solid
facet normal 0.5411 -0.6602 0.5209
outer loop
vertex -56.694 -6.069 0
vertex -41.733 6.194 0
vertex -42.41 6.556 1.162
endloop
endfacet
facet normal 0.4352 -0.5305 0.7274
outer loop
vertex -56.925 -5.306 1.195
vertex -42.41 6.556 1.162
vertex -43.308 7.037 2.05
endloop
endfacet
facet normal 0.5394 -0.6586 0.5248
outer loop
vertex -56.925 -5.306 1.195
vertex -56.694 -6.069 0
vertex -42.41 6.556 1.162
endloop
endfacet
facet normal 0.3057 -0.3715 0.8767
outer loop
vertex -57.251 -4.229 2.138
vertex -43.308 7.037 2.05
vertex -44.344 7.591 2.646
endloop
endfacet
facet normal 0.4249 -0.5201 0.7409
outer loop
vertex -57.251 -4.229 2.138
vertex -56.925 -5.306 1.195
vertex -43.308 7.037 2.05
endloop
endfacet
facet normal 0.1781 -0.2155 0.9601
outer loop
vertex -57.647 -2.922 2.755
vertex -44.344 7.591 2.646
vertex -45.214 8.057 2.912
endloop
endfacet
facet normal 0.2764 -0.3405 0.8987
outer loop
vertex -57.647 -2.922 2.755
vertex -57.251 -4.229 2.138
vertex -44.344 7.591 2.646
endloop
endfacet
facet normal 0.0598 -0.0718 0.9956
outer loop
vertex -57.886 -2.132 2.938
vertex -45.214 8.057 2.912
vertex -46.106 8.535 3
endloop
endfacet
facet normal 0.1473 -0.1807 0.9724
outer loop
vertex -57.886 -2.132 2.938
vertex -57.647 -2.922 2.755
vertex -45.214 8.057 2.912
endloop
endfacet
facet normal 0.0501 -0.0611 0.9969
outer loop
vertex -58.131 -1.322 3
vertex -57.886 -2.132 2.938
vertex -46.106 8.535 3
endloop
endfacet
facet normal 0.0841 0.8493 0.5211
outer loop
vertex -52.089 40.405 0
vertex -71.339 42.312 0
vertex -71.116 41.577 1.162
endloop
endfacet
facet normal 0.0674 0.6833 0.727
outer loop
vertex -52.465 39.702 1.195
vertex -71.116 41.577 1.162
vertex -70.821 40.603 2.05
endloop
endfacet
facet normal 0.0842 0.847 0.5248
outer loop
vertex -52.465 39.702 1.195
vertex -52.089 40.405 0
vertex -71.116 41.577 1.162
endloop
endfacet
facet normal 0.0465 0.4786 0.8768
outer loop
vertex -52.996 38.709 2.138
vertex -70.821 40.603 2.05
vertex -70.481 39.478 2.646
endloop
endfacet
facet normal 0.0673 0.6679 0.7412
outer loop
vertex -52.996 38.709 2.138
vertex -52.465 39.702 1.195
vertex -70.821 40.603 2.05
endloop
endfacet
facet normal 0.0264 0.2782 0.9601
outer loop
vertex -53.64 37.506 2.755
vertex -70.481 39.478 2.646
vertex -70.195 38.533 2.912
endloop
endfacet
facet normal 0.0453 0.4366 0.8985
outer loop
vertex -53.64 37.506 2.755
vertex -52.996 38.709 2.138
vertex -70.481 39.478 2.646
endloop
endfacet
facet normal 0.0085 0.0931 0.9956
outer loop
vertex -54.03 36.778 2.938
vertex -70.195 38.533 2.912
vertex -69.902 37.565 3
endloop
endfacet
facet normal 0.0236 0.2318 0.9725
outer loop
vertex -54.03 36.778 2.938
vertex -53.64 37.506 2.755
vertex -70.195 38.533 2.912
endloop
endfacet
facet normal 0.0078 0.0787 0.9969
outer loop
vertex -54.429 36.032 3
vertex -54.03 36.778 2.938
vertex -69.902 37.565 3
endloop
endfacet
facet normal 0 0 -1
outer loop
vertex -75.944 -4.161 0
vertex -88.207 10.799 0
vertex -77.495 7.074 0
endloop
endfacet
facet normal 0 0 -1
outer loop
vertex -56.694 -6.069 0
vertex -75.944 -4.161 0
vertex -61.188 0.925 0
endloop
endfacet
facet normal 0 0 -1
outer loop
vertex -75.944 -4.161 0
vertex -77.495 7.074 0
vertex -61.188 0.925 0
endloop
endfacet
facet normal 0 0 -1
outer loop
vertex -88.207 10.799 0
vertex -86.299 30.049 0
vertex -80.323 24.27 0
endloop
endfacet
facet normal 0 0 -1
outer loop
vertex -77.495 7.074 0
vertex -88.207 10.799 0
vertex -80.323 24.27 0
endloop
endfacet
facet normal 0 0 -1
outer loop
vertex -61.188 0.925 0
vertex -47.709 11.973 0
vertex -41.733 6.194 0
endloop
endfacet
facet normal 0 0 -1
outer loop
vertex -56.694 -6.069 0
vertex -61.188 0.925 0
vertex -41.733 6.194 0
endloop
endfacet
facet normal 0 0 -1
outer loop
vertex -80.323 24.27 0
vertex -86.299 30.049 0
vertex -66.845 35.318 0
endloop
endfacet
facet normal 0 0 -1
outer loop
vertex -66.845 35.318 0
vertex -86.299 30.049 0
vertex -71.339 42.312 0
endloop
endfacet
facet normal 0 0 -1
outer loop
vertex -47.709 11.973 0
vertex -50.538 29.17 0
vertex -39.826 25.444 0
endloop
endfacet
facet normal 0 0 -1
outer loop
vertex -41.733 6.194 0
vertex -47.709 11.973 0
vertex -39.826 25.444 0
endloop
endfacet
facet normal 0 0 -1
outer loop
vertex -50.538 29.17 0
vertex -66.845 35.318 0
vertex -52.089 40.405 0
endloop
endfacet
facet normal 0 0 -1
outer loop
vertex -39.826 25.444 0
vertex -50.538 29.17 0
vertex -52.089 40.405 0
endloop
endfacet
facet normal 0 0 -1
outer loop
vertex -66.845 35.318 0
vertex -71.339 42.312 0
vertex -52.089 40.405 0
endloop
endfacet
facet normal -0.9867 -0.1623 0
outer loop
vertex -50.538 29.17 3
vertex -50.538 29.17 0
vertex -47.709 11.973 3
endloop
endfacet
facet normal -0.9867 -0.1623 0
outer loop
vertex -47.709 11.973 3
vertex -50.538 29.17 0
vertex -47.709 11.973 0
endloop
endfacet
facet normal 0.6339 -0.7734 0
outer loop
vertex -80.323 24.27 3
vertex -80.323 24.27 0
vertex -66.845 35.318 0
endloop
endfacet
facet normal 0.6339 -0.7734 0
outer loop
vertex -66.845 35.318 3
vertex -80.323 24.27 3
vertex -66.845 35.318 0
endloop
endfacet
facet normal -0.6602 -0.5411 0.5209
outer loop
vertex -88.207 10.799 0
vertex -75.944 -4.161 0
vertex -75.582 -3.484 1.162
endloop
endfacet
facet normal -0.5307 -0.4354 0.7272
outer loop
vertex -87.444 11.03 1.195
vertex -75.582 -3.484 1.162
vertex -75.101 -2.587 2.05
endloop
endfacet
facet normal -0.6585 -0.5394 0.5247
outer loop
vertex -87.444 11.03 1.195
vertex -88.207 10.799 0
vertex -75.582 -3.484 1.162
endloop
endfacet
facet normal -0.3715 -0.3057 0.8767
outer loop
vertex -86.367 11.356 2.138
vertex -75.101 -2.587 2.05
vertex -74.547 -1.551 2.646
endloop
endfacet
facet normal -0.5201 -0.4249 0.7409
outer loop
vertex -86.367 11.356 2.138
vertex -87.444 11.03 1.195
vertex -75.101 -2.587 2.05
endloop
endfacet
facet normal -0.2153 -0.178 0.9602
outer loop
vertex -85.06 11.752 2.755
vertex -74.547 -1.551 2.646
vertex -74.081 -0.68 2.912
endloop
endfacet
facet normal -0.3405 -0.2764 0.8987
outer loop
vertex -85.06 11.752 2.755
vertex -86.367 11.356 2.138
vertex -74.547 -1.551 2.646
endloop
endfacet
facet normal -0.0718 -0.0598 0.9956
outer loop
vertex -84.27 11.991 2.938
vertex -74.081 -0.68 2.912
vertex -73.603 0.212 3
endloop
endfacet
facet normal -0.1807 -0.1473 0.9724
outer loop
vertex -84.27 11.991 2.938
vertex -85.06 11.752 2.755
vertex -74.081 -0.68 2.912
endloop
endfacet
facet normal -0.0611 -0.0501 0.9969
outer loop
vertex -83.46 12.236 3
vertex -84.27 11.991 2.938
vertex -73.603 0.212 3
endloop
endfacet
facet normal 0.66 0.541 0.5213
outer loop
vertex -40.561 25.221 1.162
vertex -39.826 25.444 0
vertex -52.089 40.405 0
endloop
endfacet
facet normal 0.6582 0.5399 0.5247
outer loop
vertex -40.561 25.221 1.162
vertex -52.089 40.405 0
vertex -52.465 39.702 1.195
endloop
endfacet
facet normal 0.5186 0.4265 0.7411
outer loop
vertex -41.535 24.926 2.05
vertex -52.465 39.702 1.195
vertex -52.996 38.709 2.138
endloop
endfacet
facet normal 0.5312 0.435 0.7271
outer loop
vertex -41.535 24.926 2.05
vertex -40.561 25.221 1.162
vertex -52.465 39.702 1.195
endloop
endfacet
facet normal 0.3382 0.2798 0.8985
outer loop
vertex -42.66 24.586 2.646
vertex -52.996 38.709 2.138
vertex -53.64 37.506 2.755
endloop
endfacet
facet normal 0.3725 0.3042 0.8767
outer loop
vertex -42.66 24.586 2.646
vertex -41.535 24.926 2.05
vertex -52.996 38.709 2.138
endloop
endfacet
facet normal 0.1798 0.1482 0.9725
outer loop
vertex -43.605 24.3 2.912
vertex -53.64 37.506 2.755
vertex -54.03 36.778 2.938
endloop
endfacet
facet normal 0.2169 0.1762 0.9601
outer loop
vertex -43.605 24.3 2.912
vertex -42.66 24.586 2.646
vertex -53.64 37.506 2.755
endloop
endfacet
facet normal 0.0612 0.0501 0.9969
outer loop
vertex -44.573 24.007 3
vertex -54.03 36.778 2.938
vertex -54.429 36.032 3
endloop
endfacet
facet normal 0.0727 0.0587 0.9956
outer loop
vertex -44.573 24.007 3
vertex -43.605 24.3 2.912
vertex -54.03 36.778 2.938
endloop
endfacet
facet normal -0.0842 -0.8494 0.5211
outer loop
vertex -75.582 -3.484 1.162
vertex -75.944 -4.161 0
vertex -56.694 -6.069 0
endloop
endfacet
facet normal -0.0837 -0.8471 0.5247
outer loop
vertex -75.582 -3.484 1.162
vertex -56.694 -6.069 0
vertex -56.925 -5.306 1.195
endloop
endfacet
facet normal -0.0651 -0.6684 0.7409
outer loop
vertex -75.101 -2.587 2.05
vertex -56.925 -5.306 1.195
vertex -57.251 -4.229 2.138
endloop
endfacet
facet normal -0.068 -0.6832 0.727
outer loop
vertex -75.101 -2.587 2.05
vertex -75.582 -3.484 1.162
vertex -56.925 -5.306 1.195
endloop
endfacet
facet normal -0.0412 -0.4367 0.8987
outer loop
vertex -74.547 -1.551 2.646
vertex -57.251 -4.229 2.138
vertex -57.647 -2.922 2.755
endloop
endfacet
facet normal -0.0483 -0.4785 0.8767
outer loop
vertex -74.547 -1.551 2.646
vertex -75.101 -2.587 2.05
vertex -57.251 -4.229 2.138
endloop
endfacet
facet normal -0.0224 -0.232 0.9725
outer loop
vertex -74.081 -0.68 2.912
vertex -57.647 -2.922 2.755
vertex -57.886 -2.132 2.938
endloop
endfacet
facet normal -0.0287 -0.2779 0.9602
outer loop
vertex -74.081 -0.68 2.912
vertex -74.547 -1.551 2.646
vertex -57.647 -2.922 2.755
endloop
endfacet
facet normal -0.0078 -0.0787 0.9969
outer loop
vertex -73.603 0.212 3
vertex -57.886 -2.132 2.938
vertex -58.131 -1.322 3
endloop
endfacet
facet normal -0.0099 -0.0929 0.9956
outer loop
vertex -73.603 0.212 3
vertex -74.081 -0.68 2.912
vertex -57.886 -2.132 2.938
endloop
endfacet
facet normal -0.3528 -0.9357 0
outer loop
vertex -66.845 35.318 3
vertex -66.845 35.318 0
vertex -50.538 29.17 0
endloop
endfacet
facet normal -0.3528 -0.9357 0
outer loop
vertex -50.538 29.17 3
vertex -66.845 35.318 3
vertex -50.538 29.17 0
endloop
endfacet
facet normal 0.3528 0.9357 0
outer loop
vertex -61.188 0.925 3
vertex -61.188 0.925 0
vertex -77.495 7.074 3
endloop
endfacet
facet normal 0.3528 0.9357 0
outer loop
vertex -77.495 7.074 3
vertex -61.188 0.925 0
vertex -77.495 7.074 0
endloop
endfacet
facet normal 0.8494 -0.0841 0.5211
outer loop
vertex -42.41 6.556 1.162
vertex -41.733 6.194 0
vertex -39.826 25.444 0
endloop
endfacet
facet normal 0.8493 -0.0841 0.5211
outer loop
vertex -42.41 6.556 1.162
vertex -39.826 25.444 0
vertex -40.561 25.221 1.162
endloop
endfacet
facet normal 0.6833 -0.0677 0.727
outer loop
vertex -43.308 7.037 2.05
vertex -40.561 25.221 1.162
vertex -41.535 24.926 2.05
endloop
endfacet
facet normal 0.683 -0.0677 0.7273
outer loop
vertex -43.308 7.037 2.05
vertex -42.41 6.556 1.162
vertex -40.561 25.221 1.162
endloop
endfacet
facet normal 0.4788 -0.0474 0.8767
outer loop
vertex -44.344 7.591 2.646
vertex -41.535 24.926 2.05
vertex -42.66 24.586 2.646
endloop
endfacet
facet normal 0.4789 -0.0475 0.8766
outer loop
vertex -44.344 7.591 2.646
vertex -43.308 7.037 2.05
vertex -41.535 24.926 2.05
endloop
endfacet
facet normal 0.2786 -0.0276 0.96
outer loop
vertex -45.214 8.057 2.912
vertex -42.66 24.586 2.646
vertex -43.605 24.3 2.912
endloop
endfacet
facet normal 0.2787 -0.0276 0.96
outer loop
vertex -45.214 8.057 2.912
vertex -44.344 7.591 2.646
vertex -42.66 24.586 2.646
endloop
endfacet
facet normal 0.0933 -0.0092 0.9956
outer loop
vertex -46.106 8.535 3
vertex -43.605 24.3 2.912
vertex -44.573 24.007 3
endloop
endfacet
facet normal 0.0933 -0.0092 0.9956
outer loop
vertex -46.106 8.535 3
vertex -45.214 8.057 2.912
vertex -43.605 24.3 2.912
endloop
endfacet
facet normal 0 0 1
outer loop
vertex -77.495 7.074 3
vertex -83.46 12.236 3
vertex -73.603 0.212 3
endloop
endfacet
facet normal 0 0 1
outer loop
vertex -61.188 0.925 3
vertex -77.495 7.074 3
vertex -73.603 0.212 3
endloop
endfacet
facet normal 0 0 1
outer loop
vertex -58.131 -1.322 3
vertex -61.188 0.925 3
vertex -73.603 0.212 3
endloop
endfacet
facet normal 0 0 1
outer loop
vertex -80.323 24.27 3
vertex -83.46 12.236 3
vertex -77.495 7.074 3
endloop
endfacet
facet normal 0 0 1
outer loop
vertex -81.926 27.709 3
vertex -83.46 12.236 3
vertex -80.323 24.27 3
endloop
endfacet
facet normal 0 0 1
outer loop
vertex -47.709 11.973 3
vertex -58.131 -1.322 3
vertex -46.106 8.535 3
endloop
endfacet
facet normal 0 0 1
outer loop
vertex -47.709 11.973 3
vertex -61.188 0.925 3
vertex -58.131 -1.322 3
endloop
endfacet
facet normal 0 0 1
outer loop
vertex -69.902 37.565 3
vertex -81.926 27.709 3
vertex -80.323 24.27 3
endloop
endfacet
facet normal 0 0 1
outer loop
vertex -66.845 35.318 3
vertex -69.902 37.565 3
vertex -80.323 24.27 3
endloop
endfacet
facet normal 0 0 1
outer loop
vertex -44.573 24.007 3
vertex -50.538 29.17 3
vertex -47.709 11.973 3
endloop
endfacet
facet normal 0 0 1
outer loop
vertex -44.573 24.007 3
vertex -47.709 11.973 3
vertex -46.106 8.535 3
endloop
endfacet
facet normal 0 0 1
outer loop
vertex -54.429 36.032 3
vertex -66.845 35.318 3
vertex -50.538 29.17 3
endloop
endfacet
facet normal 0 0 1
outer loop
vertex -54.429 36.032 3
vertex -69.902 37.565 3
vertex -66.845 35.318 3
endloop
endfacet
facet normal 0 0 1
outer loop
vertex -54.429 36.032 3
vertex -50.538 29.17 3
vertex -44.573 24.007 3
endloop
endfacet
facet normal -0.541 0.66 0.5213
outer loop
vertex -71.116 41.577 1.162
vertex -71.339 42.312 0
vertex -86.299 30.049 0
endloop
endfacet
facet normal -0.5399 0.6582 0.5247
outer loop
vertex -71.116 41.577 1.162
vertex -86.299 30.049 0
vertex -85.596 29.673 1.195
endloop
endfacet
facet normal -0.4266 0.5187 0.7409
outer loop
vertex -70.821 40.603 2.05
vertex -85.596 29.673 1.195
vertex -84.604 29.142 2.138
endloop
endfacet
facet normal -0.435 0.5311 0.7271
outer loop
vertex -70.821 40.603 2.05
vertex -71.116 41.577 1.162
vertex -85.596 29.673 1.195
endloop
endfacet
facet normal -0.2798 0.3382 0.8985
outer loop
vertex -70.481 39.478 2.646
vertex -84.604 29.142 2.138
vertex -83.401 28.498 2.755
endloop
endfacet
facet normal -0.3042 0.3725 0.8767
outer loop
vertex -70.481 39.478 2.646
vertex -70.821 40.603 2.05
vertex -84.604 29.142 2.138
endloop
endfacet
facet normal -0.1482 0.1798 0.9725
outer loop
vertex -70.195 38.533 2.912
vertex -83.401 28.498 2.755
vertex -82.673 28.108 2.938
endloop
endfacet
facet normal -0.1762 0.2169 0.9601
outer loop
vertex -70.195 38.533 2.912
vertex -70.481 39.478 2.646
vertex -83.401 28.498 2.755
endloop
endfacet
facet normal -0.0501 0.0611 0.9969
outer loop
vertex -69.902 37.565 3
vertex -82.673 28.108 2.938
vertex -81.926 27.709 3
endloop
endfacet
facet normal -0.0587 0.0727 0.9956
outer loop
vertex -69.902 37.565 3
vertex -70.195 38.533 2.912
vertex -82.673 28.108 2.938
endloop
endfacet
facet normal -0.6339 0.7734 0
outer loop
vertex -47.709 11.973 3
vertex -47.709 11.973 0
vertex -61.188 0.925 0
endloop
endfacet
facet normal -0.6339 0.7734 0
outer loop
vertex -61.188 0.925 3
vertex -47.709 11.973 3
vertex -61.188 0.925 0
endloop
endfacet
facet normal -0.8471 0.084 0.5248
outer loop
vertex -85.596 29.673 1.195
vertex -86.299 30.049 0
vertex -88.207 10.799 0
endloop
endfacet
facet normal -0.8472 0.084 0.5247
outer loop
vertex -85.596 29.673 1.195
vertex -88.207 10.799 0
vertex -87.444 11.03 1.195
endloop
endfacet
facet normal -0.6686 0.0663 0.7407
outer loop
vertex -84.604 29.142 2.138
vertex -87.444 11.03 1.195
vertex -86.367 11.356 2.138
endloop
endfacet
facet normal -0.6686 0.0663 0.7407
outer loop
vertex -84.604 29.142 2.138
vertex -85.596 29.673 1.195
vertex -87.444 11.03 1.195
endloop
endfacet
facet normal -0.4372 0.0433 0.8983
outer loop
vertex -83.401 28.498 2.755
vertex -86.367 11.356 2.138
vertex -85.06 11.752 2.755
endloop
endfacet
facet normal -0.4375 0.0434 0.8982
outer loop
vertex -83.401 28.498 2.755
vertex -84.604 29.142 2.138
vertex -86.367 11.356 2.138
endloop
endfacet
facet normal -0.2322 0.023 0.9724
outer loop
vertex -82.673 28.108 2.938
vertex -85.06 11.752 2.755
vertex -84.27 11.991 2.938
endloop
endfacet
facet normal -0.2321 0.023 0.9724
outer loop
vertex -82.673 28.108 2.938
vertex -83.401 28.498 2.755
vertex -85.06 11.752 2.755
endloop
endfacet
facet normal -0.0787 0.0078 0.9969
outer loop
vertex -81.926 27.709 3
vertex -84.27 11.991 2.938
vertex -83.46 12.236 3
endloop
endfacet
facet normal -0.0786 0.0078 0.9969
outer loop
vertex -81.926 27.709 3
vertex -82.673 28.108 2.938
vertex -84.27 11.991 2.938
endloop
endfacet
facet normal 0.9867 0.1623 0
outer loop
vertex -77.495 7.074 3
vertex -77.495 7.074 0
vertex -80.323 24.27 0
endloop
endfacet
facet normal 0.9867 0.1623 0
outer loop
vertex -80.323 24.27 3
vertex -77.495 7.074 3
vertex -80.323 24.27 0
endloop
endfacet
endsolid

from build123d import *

# Parameters (mm, degrees)
F1_DEPTH     = 3
F2_T1_DEPTH  = 42.25719254
F2_T3_DEPTH  = 42.25719254
F2_T5_DEPTH  = 42.25719254
F2_T7_DEPTH  = 42.25719254
F2_T9_DEPTH  = 42.25719254
F2_T11_DEPTH = 42.25719254
F2_T13_DEPTH = 42.25719254
F2_T15_DEPTH = 42.25719254


# Not quite as in the source:
# - a fillet or chamfer that OpenCascade refuses, or shapes differently, is made with other operations: its cross-section is extruded or revolved along the edge and cut away or added


with BuildPart() as f1:
    # F0 (on Top) → F1 (new body)
    with BuildSketch(Plane.XY):
        Polygon((-56.6940829158, -6.0690771788), (-41.7333427947, 6.1938238515), (-39.825682479, 25.4438451183), (-52.0885835093, 40.4045852394), (-71.3386047761, 42.3122455551), (-86.2993448973, 30.0493445247), (-88.2070052129, 10.7993232579), (-75.9441041826, -4.1614168632), align=None)
        Polygon((-77.4948558278, 7.0736241854), (-80.3234138592, 24.2703379682), (-66.8449018774, 35.318297971), (-50.5378318641, 29.1695441909), (-47.7092738327, 11.972830408), (-61.1877858145, 0.9248704053), align=None, mode=Mode.SUBTRACT)
    extrude(amount=F1_DEPTH)

    # F2: fillet of radius 5 on 8 edges, made by hand

    # F2_s2 → F2_t1 (cut)
    with BuildSketch(Plane(origin=(-44.1465389595, 4.3748835016, 0), x_dir=(0, 0, 1), z_dir=(-0.9951255548, 0.0986160744, 0))):
        with BuildLine():
            ThreePointArc((0, 35.0708636755), (2.1833001327, 33.2269007681), (3, 30.4882879806))
            Line((3, 30.4882879806), (3, 35.0708636755))
            Line((3, 35.0708636755), (0, 35.0708636755))
        make_face()
    extrude(amount=F2_T1_DEPTH, mode=Mode.SUBTRACT)

    # F2_s4 → F2_t3 (cut)
    with BuildSketch(Plane(origin=(-13.0651926295, -10.709173668, 0), x_dir=(0, 0, 1), z_dir=(-0.7733921229, -0.633927933, 0))):
        with BuildLine():
            ThreePointArc((0, 77.9474916828), (2.1833001327, 76.1035287753), (3, 73.3649159878))
            Line((3, 73.3649159878), (3, 77.9474916828))
            Line((3, 77.9474916828), (0, 77.9474916828))
        make_face()
    extrude(amount=F2_T3_DEPTH, mode=Mode.SUBTRACT)

    # F2_s6 → F2_t5 (cut)
    with BuildSketch(Plane(origin=(3.2394204217, 32.6886875499, 0), x_dir=(0, 0, 1), z_dir=(-0.0986160744, -0.9951255548, 0))):
        with BuildLine():
            ThreePointArc((0, 88.8420318681), (2.1833001327, 86.9980689606), (3, 84.2594561731))
            Line((3, 84.2594561731), (3, 88.8420318681))
            Line((3, 88.8420318681), (0, 88.8420318681))
        make_face()
    extrude(amount=F2_T5_DEPTH, mode=Mode.SUBTRACT)

    # F2_s8 → F2_t7 (cut)
    with BuildSketch(Plane(origin=(-48.0044686533, 58.5654551398, 0), x_dir=(0, 0, 1), z_dir=(0.633927933, -0.7733921229, 0))):
        with BuildLine():
            ThreePointArc((0, 61.3726103468), (2.1833001327, 59.5286474393), (3, 56.7900346518))
            Line((3, 56.7900346518), (3, 61.3726103468))
            Line((3, 61.3726103468), (0, 61.3726103468))
        make_face()
    extrude(amount=F2_T7_DEPTH, mode=Mode.SUBTRACT)

    # F2_s10 → F2_t9 (cut)
    with BuildSketch(Plane(origin=(-86.1977511311, 8.5421219464, 0), x_dir=(0, 0, 1), z_dir=(0.9951255548, -0.0986160744, 0))):
        with BuildLine():
            ThreePointArc((0, 11.6304416954), (2.1833001327, 9.786478788), (3, 7.0478660005))
            Line((3, 7.0478660005), (3, 11.6304416954))
            Line((3, 11.6304416954), (0, 11.6304416954))
        make_face()
    extrude(amount=F2_T9_DEPTH, mode=Mode.SUBTRACT)

    # F2_s12 → F2_t11 (cut)
    with BuildSketch(Plane(origin=(-45.7465724763, -37.4971883885, 0), x_dir=(0, 0, 1), z_dir=(0.7733921229, 0.633927933, 0))):
        with BuildLine():
            ThreePointArc((0, -31.2461863118), (2.1833001327, -33.0901492192), (3, -35.8287620068))
            Line((3, -35.8287620068), (3, -31.2461863118))
            Line((3, -31.2461863118), (0, -31.2461863118))
        make_face()
    extrude(amount=F2_T11_DEPTH, mode=Mode.SUBTRACT)

    # F2_s14 → F2_t13 (cut)
    with BuildSketch(Plane(origin=(-0.927818023, -9.3625246217, 0), x_dir=(0, 0, 1), z_dir=(0.0986160744, 0.9951255548, 0))):
        with BuildLine():
            ThreePointArc((0, -42.1407264971), (2.1833001327, -43.9846894046), (3, -46.7233021921))
            Line((3, -46.7233021921), (3, -42.1407264971))
            Line((3, -42.1407264971), (0, -42.1407264971))
        make_face()
    extrude(amount=F2_T13_DEPTH, mode=Mode.SUBTRACT)

    # F2_s16 → F2_t15 (cut)
    with BuildSketch(Plane(origin=(-21.2164539328, 25.884075293, 0), x_dir=(0, 0, 1), z_dir=(-0.633927933, 0.7733921229, 0))):
        with BuildLine():
            ThreePointArc((0, -14.6713049758), (2.1833001327, -16.5152678832), (3, -19.2538806708))
            Line((3, -19.2538806708), (3, -14.6713049758))
            Line((3, -14.6713049758), (0, -14.6713049758))
        make_face()
    extrude(amount=F2_T15_DEPTH, mode=Mode.SUBTRACT)


solid = f1.part
